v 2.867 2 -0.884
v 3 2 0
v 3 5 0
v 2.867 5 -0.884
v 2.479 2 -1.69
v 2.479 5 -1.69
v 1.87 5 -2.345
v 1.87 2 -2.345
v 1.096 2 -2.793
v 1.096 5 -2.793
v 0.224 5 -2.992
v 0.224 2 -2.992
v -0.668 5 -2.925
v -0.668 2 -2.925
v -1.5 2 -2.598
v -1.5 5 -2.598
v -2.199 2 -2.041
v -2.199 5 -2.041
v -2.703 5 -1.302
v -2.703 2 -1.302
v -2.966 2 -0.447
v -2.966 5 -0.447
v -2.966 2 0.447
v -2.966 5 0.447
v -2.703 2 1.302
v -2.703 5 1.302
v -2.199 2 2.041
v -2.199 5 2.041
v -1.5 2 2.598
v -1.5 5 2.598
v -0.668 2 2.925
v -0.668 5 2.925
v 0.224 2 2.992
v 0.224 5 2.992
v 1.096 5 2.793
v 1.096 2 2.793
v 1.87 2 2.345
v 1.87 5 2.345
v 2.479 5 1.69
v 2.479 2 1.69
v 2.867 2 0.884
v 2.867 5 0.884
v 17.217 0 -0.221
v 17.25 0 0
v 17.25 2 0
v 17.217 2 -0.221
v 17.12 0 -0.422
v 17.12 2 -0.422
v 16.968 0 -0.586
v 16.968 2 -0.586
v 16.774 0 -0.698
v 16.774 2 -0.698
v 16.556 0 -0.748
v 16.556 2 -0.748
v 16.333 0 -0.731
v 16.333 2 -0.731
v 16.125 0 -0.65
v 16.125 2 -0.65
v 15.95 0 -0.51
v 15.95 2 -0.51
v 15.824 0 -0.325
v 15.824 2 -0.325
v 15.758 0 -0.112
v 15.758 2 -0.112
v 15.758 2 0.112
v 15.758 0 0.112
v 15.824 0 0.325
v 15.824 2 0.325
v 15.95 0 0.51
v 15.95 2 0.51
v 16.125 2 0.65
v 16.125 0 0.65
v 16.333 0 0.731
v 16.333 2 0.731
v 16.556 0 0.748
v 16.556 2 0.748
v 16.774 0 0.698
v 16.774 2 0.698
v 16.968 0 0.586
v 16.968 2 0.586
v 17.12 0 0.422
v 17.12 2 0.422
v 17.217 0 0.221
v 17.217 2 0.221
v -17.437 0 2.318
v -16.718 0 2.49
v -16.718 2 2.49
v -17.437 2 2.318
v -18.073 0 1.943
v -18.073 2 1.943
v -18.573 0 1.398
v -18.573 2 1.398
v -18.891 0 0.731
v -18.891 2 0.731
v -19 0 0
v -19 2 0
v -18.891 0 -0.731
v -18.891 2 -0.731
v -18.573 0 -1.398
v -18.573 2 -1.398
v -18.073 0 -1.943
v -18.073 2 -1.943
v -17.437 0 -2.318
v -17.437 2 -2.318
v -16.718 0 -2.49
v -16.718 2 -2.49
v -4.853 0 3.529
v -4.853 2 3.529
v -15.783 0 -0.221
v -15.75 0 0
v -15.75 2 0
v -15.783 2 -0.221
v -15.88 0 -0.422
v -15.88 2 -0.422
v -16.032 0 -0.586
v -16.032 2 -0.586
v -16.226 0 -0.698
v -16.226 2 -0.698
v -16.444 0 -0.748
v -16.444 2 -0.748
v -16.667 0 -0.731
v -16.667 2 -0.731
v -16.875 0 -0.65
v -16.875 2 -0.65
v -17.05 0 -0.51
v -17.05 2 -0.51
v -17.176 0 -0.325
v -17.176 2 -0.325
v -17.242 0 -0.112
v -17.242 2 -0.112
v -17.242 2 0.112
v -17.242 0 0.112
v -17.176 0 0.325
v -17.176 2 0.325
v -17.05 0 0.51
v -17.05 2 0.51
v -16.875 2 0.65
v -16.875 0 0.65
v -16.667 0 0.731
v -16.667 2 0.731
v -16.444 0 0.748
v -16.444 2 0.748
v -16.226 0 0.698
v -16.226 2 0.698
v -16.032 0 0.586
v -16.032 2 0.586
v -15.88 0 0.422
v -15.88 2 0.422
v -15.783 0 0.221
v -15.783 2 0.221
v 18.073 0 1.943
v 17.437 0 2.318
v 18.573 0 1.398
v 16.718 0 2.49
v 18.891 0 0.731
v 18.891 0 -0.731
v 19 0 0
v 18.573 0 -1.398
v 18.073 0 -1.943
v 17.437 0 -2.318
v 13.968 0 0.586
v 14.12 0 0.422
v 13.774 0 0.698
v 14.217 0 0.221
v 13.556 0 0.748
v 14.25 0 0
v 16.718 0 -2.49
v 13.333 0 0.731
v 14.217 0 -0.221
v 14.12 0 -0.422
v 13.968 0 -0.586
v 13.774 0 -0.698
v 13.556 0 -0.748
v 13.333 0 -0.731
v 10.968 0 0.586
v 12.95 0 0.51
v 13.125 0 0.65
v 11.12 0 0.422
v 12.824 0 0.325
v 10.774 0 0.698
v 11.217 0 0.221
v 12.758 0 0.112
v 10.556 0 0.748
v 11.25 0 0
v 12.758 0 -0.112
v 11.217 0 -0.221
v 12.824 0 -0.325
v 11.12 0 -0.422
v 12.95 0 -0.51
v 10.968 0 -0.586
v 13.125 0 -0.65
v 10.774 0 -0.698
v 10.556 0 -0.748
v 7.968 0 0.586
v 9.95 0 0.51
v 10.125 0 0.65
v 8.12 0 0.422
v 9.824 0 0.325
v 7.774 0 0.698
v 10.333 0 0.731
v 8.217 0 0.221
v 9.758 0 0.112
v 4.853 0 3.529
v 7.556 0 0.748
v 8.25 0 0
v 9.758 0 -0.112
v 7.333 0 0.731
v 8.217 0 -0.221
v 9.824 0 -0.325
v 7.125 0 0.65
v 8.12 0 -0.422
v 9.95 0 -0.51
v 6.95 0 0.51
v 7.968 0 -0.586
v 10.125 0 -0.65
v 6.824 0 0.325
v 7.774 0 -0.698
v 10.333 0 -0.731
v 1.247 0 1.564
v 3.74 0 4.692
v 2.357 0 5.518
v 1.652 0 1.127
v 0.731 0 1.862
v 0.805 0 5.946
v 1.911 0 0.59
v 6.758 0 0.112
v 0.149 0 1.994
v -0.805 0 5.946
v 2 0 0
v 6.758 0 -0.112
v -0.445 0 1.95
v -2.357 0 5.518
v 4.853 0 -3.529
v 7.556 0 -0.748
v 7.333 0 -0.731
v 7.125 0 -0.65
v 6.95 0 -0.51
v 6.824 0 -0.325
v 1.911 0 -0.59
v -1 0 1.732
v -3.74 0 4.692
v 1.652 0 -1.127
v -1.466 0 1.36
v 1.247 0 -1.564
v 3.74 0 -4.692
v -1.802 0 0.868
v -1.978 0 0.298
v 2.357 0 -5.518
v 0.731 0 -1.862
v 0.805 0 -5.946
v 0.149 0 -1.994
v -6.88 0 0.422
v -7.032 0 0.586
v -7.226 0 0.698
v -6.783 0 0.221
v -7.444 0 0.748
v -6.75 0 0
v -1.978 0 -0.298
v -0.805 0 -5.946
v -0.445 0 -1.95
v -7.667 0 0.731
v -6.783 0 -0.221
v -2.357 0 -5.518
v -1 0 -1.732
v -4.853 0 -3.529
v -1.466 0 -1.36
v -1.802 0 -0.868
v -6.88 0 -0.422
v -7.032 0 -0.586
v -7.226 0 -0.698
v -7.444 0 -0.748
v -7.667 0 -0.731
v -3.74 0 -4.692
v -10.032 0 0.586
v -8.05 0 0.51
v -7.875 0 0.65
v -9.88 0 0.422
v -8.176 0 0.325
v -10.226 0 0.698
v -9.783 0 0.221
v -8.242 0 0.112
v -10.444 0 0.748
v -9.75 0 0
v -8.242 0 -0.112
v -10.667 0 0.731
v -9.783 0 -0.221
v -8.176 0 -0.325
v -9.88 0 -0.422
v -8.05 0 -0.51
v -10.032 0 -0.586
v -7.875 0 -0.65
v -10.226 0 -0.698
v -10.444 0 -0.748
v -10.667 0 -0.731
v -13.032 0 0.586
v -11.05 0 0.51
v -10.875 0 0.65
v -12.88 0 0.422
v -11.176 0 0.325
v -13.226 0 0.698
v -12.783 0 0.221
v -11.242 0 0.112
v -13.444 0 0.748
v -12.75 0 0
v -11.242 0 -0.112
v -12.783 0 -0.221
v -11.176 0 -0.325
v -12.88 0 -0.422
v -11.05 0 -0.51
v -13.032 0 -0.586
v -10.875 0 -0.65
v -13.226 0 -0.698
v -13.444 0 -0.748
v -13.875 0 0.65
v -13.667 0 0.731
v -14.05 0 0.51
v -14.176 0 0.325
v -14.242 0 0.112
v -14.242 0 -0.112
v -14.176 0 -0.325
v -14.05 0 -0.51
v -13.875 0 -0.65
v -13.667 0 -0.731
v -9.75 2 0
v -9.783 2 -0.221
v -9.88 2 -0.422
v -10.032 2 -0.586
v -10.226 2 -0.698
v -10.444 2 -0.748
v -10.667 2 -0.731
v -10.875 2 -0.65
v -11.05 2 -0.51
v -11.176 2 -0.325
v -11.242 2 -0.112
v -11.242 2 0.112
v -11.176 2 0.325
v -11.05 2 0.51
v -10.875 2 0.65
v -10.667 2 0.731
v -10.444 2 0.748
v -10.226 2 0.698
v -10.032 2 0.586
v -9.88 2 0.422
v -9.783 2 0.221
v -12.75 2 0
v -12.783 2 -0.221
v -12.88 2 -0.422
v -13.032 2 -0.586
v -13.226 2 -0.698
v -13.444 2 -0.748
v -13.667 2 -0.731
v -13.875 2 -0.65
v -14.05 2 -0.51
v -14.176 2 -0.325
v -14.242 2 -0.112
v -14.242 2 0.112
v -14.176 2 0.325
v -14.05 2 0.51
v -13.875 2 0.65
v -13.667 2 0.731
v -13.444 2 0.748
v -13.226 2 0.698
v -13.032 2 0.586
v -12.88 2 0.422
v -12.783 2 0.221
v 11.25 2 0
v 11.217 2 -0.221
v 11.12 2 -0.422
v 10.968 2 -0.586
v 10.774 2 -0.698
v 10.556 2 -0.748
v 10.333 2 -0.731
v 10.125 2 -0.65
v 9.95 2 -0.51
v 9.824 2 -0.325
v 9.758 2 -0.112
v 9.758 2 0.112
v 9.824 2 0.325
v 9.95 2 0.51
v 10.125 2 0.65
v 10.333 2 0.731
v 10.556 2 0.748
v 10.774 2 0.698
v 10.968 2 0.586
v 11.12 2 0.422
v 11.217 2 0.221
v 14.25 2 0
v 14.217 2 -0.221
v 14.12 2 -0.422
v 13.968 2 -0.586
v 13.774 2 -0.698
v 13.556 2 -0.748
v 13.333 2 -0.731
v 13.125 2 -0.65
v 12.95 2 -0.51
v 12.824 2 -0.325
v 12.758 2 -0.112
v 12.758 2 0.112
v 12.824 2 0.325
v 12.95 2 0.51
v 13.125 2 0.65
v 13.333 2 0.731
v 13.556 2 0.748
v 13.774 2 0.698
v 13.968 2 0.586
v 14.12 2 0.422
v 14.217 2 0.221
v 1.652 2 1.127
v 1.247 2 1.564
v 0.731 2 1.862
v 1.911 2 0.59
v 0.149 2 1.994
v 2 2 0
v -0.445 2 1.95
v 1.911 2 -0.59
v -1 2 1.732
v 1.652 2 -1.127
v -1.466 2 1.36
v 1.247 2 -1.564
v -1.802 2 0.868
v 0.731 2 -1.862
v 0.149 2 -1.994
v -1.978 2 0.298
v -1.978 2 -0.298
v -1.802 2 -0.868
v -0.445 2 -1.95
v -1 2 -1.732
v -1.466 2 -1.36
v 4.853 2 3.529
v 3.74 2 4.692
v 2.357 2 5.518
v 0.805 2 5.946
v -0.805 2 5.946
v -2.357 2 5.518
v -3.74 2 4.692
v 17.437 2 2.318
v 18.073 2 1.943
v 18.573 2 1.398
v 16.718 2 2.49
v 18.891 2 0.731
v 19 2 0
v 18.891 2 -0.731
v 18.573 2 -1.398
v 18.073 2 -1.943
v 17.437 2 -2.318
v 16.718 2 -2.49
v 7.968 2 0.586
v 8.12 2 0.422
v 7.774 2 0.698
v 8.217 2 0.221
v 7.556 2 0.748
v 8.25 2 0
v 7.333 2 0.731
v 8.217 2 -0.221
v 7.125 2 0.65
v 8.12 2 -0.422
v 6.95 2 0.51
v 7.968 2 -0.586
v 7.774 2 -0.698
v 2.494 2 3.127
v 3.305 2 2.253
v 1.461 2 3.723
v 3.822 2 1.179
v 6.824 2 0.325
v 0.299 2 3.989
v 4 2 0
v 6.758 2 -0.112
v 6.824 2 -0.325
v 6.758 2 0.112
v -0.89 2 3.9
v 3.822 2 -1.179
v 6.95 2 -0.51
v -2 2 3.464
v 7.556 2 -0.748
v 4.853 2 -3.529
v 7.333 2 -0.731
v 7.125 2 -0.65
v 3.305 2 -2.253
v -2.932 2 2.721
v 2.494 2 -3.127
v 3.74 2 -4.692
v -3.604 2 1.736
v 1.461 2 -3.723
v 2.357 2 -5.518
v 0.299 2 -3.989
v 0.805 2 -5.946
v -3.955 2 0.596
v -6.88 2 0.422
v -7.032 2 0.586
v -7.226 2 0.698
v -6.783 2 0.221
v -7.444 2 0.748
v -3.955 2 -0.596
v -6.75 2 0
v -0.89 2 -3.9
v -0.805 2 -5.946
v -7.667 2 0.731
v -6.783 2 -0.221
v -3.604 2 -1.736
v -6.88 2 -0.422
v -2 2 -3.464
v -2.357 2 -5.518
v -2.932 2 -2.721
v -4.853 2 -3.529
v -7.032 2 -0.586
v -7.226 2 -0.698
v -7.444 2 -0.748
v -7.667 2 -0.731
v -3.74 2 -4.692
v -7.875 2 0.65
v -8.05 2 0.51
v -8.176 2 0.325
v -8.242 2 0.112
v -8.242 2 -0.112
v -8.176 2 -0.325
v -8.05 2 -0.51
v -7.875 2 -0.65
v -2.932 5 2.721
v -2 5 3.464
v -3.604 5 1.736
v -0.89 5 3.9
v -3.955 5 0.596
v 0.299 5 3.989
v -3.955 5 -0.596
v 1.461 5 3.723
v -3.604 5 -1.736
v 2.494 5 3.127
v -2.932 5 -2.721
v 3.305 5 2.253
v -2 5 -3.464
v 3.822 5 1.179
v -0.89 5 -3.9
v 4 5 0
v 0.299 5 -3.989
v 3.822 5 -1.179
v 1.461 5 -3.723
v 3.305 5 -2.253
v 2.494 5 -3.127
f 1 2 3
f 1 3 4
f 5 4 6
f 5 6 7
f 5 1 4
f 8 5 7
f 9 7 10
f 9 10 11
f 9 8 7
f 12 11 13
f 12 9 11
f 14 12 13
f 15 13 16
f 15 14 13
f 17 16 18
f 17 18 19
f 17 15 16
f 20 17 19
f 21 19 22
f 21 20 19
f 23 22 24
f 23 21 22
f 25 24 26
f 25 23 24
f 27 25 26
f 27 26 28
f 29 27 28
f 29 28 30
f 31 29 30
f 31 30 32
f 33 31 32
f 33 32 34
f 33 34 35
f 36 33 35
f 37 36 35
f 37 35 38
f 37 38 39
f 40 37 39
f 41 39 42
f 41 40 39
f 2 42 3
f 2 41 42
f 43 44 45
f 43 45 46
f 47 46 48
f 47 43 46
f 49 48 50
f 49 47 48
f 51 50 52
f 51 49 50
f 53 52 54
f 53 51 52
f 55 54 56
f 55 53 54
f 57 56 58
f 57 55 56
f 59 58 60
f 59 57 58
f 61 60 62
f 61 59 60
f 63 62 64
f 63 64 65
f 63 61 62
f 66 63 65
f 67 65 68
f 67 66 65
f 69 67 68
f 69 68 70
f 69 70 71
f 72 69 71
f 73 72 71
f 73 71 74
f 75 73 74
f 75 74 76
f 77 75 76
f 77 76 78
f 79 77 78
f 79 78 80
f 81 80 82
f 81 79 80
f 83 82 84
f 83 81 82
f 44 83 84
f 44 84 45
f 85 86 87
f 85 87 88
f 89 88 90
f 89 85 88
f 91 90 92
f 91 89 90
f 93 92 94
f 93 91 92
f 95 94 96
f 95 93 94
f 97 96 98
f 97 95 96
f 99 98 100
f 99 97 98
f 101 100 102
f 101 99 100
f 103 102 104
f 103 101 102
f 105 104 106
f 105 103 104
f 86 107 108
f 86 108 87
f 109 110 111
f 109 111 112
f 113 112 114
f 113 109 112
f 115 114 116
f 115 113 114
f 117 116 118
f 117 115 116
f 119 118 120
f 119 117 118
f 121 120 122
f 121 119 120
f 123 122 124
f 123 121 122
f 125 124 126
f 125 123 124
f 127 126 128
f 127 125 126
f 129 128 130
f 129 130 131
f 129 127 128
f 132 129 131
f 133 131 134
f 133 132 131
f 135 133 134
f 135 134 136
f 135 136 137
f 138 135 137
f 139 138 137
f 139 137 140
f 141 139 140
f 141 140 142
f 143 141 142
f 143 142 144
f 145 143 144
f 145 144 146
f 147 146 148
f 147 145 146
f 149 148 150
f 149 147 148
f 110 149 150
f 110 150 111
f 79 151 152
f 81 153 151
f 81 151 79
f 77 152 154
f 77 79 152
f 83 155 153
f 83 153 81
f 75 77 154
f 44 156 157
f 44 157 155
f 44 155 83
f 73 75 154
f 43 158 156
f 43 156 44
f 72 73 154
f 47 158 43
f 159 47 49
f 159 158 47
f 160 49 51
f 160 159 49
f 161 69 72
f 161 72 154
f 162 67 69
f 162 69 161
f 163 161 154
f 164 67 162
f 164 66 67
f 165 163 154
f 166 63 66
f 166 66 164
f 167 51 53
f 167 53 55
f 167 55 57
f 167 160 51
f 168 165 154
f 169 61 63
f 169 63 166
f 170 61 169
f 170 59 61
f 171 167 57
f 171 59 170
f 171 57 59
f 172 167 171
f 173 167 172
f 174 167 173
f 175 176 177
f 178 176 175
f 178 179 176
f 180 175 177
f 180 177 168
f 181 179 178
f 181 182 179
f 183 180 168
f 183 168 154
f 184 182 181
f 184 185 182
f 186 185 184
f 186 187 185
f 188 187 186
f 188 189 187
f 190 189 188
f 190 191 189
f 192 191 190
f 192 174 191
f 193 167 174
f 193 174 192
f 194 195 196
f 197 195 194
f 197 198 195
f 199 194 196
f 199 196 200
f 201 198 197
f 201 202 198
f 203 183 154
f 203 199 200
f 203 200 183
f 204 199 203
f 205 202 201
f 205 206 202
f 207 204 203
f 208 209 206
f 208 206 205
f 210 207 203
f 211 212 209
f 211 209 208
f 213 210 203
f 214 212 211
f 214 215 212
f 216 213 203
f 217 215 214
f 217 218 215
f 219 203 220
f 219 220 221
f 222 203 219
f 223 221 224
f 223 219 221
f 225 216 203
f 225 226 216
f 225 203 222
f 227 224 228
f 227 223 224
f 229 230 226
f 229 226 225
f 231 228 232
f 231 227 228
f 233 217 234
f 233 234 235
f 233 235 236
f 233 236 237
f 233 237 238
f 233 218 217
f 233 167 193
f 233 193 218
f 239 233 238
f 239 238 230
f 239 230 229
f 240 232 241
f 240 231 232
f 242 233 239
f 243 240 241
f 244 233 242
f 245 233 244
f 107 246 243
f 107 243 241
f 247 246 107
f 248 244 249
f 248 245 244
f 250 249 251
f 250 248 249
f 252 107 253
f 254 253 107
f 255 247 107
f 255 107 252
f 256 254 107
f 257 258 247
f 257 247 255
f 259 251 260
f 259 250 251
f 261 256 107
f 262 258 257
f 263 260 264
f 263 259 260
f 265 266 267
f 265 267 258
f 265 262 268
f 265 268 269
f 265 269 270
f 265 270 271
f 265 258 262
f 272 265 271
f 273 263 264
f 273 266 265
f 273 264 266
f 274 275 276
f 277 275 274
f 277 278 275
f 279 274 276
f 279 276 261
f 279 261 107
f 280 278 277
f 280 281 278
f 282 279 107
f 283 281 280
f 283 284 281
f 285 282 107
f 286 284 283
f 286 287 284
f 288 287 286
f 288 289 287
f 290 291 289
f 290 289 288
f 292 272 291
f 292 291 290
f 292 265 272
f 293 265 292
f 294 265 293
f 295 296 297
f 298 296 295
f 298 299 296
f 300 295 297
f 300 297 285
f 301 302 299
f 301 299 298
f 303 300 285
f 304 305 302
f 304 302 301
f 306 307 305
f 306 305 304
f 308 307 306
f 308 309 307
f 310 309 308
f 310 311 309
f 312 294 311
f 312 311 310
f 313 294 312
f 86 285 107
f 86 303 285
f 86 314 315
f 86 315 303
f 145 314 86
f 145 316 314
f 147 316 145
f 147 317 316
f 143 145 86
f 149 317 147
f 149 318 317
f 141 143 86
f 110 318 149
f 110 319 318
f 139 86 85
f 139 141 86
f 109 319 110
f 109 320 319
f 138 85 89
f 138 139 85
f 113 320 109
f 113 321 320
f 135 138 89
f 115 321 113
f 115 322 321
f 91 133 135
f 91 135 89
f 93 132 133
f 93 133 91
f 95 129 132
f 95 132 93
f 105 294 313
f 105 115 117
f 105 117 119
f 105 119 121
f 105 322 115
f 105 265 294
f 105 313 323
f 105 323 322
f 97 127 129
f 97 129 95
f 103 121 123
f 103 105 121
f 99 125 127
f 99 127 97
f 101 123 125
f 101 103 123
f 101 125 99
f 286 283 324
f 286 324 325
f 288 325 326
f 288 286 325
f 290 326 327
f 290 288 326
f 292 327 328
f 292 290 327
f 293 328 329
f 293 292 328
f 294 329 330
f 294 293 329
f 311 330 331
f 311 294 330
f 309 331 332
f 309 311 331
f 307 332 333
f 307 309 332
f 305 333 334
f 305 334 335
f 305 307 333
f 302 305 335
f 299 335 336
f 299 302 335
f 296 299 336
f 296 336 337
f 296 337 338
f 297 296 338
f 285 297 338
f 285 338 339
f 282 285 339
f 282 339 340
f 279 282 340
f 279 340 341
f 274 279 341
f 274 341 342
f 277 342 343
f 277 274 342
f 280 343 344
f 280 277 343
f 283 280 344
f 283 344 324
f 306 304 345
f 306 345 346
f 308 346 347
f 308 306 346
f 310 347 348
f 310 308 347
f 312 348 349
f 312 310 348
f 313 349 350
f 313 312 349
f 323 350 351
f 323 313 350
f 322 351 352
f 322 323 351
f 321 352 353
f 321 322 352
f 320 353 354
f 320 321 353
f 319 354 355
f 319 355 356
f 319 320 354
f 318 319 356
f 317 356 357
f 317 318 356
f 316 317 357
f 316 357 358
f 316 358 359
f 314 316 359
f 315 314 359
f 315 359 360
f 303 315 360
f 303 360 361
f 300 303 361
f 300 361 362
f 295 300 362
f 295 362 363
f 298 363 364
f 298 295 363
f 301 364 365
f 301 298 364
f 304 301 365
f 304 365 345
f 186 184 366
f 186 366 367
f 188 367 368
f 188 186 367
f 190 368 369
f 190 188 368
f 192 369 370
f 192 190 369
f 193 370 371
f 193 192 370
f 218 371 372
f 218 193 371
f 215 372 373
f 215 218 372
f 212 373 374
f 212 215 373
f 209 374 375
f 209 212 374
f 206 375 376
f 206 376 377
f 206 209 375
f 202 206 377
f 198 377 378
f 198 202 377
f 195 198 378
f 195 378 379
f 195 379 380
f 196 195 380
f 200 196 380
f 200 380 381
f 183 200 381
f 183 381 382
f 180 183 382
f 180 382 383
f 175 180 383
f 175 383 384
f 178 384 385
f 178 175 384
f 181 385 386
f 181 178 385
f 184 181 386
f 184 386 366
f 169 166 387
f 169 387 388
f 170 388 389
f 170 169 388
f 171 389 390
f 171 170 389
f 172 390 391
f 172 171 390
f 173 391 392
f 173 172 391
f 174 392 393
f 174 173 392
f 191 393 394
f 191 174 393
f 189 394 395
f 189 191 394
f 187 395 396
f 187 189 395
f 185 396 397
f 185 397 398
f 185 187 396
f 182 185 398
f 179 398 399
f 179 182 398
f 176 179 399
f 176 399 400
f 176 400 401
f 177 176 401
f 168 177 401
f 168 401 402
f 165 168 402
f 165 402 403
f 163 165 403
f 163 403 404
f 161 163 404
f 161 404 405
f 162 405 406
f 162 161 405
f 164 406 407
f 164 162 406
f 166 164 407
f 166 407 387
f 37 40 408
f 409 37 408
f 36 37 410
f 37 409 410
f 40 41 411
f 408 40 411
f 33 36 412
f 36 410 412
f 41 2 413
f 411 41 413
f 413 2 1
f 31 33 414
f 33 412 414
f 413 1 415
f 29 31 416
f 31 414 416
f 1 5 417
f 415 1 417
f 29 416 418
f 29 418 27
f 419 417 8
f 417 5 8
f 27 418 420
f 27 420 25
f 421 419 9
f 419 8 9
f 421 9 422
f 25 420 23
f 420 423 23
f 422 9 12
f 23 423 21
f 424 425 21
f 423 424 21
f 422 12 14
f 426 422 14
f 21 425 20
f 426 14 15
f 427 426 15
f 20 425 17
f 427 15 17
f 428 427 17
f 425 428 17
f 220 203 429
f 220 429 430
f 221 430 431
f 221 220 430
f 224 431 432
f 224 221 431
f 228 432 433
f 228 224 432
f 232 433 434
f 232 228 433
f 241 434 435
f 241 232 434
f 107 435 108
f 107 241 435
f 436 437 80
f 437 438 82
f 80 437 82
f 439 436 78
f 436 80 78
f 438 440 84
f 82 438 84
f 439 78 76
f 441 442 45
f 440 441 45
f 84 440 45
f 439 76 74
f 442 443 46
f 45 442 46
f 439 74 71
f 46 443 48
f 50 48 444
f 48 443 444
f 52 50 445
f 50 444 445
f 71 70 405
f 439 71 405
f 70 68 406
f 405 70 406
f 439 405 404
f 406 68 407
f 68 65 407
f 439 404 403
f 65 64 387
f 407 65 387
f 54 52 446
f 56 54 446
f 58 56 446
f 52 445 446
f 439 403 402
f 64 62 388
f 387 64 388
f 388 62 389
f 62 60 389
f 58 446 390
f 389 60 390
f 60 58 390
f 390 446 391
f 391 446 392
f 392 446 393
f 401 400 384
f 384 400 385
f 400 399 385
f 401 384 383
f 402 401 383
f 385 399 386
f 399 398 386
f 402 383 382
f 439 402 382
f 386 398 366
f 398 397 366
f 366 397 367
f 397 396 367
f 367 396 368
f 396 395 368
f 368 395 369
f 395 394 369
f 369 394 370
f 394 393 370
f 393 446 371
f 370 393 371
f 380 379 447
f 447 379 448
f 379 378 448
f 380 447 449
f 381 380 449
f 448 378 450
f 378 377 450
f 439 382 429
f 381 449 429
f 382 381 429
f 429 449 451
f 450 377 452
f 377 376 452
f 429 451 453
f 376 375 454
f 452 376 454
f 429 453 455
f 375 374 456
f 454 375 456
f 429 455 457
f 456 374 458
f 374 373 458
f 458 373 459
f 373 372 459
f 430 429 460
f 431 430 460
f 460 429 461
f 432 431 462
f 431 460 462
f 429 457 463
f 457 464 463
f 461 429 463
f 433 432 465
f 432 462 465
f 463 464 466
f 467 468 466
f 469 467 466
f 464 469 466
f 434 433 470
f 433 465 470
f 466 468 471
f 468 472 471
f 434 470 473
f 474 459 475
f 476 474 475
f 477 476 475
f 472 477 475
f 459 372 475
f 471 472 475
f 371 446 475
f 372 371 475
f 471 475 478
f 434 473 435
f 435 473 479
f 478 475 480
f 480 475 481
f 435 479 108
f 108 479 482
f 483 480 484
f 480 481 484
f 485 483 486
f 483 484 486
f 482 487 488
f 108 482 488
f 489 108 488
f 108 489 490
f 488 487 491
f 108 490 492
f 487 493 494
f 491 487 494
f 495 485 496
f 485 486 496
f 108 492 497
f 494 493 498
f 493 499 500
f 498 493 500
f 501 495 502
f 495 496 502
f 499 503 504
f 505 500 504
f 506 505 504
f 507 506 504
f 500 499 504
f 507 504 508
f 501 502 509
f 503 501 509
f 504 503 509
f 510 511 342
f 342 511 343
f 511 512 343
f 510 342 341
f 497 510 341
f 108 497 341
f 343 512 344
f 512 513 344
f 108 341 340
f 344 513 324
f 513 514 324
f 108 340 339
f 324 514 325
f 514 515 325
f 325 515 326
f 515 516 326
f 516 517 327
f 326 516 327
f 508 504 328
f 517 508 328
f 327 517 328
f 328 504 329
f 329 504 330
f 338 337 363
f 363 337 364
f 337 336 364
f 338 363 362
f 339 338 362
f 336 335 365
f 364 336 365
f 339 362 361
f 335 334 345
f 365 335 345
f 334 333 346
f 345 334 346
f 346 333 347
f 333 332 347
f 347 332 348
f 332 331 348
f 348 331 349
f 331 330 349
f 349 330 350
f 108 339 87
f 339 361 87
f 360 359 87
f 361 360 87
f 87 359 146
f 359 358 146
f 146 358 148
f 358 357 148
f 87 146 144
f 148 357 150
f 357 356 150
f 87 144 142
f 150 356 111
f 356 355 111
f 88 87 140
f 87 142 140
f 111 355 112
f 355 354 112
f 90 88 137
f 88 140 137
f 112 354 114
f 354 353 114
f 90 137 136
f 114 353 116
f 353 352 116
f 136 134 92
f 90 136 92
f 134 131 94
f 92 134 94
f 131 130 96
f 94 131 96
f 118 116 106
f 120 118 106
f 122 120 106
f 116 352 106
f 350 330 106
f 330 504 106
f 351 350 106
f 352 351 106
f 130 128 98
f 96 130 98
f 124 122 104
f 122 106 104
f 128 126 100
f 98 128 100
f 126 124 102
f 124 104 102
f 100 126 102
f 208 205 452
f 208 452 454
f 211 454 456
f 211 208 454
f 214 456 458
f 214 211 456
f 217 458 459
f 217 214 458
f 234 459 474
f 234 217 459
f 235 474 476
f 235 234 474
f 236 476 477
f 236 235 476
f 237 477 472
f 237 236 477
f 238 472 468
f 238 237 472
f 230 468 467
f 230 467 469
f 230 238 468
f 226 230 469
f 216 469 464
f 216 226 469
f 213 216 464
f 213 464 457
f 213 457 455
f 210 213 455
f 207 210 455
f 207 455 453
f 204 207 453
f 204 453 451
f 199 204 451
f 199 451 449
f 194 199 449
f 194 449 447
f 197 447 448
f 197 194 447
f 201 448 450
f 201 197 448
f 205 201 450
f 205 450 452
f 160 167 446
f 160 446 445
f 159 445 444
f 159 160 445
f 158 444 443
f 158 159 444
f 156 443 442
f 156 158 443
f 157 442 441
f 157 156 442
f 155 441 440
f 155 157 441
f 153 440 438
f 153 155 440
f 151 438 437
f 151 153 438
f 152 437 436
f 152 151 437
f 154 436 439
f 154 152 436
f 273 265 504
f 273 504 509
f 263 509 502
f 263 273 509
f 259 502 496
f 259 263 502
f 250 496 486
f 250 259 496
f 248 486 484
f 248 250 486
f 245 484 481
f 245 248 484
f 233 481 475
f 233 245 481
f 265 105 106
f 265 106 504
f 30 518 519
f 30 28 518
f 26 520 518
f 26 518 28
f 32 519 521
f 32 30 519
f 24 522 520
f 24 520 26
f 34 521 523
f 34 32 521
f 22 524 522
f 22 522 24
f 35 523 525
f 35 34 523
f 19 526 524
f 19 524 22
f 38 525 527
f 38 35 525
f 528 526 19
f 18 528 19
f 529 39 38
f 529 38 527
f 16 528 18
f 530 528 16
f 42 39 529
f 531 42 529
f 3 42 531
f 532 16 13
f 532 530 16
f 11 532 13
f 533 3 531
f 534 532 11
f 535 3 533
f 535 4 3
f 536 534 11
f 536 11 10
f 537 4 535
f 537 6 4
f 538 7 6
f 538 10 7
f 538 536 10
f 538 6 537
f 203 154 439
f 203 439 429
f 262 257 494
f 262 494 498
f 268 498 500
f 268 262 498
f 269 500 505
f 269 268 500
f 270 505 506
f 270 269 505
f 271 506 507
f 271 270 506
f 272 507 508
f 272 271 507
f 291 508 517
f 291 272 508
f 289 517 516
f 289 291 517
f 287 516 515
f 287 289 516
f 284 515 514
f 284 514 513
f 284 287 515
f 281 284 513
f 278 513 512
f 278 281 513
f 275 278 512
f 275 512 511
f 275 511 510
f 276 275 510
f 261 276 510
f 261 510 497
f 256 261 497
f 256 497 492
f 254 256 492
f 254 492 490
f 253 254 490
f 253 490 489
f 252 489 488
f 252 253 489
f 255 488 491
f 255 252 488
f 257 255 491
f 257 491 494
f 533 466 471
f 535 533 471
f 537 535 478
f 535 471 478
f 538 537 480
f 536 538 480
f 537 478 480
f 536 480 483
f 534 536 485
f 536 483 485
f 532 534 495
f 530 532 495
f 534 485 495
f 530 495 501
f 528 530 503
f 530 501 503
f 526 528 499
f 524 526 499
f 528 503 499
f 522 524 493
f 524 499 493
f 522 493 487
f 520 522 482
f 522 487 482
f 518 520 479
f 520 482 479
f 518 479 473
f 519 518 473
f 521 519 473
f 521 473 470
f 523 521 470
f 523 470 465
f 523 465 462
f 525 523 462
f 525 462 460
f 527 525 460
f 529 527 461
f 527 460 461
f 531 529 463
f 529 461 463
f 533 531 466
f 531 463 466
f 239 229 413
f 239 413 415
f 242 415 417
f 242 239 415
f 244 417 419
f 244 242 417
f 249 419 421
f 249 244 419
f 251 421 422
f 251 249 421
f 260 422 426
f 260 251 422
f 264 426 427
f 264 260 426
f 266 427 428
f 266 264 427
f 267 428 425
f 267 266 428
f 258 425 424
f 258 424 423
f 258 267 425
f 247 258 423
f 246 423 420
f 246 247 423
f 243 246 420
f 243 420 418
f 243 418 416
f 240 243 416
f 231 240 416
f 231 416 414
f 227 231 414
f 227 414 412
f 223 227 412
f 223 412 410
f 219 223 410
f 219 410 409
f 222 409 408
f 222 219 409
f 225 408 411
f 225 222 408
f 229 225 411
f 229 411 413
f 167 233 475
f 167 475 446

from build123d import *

# Parameters (mm, degrees)
SKETCH1_R           = 2
SKETCH1_R_2         = 0.75
BOSS_EXTRUDE1_DEPTH = 2
SKETCH2_R           = 4
SKETCH2_R_2         = 3
BOSS_EXTRUDE2_DEPTH = 3


with BuildPart() as part:
    # Sketch1 → Boss-Extrude1 (new body)
    with BuildSketch(Plane(origin=(0, 0, 0), x_dir=(1, 0, 0), z_dir=(0, 1, 0))):
        with BuildLine():
            Line((16.717889357, -2.490486745), (4.852765263, -3.528550595))
            ThreePointArc((4.852765263, -3.528550595), (0, -6), (-4.852765263, -3.528550595))
            Line((-4.852765263, -3.528550595), (-16.717889357, -2.490486745))
            ThreePointArc((-16.717889357, -2.490486745), (-19, 0), (-16.717889357, 2.490486745))
            Line((-16.717889357, 2.490486745), (-4.852765263, 3.528550595))
            ThreePointArc((-4.852765263, 3.528550595), (0, 6), (4.852765263, 3.528550595))
            Line((4.852765263, 3.528550595), (16.717889357, 2.490486745))
            ThreePointArc((16.717889357, 2.490486745), (19, 0), (16.717889357, -2.490486745))
        make_face()
        Circle(SKETCH1_R, mode=Mode.SUBTRACT)
        with Locations((7.5, 0)):
            Circle(SKETCH1_R_2, mode=Mode.SUBTRACT)
        with Locations((10.5, 0)):
            Circle(SKETCH1_R_2, mode=Mode.SUBTRACT)
        with Locations((13.5, 0)):
            Circle(SKETCH1_R_2, mode=Mode.SUBTRACT)
        with Locations((16.5, 0)):
            Circle(SKETCH1_R_2, mode=Mode.SUBTRACT)
        with Locations((-16.5, 0)):
            Circle(SKETCH1_R_2, mode=Mode.SUBTRACT)
        with Locations((-13.5, 0)):
            Circle(SKETCH1_R_2, mode=Mode.SUBTRACT)
        with Locations((-10.5, 0)):
            Circle(SKETCH1_R_2, mode=Mode.SUBTRACT)
        with Locations((-7.5, 0)):
            Circle(SKETCH1_R_2, mode=Mode.SUBTRACT)
    extrude(amount=BOSS_EXTRUDE1_DEPTH)

    # Sketch2 → Boss-Extrude2 (add)
    with BuildSketch(Plane(origin=(0, 2, 0), x_dir=(1, 0, 0), z_dir=(0, 1, 0))):
        Circle(SKETCH2_R)
        Circle(SKETCH2_R_2, mode=Mode.SUBTRACT)
    extrude(amount=BOSS_EXTRUDE2_DEPTH)


solid = part.part
